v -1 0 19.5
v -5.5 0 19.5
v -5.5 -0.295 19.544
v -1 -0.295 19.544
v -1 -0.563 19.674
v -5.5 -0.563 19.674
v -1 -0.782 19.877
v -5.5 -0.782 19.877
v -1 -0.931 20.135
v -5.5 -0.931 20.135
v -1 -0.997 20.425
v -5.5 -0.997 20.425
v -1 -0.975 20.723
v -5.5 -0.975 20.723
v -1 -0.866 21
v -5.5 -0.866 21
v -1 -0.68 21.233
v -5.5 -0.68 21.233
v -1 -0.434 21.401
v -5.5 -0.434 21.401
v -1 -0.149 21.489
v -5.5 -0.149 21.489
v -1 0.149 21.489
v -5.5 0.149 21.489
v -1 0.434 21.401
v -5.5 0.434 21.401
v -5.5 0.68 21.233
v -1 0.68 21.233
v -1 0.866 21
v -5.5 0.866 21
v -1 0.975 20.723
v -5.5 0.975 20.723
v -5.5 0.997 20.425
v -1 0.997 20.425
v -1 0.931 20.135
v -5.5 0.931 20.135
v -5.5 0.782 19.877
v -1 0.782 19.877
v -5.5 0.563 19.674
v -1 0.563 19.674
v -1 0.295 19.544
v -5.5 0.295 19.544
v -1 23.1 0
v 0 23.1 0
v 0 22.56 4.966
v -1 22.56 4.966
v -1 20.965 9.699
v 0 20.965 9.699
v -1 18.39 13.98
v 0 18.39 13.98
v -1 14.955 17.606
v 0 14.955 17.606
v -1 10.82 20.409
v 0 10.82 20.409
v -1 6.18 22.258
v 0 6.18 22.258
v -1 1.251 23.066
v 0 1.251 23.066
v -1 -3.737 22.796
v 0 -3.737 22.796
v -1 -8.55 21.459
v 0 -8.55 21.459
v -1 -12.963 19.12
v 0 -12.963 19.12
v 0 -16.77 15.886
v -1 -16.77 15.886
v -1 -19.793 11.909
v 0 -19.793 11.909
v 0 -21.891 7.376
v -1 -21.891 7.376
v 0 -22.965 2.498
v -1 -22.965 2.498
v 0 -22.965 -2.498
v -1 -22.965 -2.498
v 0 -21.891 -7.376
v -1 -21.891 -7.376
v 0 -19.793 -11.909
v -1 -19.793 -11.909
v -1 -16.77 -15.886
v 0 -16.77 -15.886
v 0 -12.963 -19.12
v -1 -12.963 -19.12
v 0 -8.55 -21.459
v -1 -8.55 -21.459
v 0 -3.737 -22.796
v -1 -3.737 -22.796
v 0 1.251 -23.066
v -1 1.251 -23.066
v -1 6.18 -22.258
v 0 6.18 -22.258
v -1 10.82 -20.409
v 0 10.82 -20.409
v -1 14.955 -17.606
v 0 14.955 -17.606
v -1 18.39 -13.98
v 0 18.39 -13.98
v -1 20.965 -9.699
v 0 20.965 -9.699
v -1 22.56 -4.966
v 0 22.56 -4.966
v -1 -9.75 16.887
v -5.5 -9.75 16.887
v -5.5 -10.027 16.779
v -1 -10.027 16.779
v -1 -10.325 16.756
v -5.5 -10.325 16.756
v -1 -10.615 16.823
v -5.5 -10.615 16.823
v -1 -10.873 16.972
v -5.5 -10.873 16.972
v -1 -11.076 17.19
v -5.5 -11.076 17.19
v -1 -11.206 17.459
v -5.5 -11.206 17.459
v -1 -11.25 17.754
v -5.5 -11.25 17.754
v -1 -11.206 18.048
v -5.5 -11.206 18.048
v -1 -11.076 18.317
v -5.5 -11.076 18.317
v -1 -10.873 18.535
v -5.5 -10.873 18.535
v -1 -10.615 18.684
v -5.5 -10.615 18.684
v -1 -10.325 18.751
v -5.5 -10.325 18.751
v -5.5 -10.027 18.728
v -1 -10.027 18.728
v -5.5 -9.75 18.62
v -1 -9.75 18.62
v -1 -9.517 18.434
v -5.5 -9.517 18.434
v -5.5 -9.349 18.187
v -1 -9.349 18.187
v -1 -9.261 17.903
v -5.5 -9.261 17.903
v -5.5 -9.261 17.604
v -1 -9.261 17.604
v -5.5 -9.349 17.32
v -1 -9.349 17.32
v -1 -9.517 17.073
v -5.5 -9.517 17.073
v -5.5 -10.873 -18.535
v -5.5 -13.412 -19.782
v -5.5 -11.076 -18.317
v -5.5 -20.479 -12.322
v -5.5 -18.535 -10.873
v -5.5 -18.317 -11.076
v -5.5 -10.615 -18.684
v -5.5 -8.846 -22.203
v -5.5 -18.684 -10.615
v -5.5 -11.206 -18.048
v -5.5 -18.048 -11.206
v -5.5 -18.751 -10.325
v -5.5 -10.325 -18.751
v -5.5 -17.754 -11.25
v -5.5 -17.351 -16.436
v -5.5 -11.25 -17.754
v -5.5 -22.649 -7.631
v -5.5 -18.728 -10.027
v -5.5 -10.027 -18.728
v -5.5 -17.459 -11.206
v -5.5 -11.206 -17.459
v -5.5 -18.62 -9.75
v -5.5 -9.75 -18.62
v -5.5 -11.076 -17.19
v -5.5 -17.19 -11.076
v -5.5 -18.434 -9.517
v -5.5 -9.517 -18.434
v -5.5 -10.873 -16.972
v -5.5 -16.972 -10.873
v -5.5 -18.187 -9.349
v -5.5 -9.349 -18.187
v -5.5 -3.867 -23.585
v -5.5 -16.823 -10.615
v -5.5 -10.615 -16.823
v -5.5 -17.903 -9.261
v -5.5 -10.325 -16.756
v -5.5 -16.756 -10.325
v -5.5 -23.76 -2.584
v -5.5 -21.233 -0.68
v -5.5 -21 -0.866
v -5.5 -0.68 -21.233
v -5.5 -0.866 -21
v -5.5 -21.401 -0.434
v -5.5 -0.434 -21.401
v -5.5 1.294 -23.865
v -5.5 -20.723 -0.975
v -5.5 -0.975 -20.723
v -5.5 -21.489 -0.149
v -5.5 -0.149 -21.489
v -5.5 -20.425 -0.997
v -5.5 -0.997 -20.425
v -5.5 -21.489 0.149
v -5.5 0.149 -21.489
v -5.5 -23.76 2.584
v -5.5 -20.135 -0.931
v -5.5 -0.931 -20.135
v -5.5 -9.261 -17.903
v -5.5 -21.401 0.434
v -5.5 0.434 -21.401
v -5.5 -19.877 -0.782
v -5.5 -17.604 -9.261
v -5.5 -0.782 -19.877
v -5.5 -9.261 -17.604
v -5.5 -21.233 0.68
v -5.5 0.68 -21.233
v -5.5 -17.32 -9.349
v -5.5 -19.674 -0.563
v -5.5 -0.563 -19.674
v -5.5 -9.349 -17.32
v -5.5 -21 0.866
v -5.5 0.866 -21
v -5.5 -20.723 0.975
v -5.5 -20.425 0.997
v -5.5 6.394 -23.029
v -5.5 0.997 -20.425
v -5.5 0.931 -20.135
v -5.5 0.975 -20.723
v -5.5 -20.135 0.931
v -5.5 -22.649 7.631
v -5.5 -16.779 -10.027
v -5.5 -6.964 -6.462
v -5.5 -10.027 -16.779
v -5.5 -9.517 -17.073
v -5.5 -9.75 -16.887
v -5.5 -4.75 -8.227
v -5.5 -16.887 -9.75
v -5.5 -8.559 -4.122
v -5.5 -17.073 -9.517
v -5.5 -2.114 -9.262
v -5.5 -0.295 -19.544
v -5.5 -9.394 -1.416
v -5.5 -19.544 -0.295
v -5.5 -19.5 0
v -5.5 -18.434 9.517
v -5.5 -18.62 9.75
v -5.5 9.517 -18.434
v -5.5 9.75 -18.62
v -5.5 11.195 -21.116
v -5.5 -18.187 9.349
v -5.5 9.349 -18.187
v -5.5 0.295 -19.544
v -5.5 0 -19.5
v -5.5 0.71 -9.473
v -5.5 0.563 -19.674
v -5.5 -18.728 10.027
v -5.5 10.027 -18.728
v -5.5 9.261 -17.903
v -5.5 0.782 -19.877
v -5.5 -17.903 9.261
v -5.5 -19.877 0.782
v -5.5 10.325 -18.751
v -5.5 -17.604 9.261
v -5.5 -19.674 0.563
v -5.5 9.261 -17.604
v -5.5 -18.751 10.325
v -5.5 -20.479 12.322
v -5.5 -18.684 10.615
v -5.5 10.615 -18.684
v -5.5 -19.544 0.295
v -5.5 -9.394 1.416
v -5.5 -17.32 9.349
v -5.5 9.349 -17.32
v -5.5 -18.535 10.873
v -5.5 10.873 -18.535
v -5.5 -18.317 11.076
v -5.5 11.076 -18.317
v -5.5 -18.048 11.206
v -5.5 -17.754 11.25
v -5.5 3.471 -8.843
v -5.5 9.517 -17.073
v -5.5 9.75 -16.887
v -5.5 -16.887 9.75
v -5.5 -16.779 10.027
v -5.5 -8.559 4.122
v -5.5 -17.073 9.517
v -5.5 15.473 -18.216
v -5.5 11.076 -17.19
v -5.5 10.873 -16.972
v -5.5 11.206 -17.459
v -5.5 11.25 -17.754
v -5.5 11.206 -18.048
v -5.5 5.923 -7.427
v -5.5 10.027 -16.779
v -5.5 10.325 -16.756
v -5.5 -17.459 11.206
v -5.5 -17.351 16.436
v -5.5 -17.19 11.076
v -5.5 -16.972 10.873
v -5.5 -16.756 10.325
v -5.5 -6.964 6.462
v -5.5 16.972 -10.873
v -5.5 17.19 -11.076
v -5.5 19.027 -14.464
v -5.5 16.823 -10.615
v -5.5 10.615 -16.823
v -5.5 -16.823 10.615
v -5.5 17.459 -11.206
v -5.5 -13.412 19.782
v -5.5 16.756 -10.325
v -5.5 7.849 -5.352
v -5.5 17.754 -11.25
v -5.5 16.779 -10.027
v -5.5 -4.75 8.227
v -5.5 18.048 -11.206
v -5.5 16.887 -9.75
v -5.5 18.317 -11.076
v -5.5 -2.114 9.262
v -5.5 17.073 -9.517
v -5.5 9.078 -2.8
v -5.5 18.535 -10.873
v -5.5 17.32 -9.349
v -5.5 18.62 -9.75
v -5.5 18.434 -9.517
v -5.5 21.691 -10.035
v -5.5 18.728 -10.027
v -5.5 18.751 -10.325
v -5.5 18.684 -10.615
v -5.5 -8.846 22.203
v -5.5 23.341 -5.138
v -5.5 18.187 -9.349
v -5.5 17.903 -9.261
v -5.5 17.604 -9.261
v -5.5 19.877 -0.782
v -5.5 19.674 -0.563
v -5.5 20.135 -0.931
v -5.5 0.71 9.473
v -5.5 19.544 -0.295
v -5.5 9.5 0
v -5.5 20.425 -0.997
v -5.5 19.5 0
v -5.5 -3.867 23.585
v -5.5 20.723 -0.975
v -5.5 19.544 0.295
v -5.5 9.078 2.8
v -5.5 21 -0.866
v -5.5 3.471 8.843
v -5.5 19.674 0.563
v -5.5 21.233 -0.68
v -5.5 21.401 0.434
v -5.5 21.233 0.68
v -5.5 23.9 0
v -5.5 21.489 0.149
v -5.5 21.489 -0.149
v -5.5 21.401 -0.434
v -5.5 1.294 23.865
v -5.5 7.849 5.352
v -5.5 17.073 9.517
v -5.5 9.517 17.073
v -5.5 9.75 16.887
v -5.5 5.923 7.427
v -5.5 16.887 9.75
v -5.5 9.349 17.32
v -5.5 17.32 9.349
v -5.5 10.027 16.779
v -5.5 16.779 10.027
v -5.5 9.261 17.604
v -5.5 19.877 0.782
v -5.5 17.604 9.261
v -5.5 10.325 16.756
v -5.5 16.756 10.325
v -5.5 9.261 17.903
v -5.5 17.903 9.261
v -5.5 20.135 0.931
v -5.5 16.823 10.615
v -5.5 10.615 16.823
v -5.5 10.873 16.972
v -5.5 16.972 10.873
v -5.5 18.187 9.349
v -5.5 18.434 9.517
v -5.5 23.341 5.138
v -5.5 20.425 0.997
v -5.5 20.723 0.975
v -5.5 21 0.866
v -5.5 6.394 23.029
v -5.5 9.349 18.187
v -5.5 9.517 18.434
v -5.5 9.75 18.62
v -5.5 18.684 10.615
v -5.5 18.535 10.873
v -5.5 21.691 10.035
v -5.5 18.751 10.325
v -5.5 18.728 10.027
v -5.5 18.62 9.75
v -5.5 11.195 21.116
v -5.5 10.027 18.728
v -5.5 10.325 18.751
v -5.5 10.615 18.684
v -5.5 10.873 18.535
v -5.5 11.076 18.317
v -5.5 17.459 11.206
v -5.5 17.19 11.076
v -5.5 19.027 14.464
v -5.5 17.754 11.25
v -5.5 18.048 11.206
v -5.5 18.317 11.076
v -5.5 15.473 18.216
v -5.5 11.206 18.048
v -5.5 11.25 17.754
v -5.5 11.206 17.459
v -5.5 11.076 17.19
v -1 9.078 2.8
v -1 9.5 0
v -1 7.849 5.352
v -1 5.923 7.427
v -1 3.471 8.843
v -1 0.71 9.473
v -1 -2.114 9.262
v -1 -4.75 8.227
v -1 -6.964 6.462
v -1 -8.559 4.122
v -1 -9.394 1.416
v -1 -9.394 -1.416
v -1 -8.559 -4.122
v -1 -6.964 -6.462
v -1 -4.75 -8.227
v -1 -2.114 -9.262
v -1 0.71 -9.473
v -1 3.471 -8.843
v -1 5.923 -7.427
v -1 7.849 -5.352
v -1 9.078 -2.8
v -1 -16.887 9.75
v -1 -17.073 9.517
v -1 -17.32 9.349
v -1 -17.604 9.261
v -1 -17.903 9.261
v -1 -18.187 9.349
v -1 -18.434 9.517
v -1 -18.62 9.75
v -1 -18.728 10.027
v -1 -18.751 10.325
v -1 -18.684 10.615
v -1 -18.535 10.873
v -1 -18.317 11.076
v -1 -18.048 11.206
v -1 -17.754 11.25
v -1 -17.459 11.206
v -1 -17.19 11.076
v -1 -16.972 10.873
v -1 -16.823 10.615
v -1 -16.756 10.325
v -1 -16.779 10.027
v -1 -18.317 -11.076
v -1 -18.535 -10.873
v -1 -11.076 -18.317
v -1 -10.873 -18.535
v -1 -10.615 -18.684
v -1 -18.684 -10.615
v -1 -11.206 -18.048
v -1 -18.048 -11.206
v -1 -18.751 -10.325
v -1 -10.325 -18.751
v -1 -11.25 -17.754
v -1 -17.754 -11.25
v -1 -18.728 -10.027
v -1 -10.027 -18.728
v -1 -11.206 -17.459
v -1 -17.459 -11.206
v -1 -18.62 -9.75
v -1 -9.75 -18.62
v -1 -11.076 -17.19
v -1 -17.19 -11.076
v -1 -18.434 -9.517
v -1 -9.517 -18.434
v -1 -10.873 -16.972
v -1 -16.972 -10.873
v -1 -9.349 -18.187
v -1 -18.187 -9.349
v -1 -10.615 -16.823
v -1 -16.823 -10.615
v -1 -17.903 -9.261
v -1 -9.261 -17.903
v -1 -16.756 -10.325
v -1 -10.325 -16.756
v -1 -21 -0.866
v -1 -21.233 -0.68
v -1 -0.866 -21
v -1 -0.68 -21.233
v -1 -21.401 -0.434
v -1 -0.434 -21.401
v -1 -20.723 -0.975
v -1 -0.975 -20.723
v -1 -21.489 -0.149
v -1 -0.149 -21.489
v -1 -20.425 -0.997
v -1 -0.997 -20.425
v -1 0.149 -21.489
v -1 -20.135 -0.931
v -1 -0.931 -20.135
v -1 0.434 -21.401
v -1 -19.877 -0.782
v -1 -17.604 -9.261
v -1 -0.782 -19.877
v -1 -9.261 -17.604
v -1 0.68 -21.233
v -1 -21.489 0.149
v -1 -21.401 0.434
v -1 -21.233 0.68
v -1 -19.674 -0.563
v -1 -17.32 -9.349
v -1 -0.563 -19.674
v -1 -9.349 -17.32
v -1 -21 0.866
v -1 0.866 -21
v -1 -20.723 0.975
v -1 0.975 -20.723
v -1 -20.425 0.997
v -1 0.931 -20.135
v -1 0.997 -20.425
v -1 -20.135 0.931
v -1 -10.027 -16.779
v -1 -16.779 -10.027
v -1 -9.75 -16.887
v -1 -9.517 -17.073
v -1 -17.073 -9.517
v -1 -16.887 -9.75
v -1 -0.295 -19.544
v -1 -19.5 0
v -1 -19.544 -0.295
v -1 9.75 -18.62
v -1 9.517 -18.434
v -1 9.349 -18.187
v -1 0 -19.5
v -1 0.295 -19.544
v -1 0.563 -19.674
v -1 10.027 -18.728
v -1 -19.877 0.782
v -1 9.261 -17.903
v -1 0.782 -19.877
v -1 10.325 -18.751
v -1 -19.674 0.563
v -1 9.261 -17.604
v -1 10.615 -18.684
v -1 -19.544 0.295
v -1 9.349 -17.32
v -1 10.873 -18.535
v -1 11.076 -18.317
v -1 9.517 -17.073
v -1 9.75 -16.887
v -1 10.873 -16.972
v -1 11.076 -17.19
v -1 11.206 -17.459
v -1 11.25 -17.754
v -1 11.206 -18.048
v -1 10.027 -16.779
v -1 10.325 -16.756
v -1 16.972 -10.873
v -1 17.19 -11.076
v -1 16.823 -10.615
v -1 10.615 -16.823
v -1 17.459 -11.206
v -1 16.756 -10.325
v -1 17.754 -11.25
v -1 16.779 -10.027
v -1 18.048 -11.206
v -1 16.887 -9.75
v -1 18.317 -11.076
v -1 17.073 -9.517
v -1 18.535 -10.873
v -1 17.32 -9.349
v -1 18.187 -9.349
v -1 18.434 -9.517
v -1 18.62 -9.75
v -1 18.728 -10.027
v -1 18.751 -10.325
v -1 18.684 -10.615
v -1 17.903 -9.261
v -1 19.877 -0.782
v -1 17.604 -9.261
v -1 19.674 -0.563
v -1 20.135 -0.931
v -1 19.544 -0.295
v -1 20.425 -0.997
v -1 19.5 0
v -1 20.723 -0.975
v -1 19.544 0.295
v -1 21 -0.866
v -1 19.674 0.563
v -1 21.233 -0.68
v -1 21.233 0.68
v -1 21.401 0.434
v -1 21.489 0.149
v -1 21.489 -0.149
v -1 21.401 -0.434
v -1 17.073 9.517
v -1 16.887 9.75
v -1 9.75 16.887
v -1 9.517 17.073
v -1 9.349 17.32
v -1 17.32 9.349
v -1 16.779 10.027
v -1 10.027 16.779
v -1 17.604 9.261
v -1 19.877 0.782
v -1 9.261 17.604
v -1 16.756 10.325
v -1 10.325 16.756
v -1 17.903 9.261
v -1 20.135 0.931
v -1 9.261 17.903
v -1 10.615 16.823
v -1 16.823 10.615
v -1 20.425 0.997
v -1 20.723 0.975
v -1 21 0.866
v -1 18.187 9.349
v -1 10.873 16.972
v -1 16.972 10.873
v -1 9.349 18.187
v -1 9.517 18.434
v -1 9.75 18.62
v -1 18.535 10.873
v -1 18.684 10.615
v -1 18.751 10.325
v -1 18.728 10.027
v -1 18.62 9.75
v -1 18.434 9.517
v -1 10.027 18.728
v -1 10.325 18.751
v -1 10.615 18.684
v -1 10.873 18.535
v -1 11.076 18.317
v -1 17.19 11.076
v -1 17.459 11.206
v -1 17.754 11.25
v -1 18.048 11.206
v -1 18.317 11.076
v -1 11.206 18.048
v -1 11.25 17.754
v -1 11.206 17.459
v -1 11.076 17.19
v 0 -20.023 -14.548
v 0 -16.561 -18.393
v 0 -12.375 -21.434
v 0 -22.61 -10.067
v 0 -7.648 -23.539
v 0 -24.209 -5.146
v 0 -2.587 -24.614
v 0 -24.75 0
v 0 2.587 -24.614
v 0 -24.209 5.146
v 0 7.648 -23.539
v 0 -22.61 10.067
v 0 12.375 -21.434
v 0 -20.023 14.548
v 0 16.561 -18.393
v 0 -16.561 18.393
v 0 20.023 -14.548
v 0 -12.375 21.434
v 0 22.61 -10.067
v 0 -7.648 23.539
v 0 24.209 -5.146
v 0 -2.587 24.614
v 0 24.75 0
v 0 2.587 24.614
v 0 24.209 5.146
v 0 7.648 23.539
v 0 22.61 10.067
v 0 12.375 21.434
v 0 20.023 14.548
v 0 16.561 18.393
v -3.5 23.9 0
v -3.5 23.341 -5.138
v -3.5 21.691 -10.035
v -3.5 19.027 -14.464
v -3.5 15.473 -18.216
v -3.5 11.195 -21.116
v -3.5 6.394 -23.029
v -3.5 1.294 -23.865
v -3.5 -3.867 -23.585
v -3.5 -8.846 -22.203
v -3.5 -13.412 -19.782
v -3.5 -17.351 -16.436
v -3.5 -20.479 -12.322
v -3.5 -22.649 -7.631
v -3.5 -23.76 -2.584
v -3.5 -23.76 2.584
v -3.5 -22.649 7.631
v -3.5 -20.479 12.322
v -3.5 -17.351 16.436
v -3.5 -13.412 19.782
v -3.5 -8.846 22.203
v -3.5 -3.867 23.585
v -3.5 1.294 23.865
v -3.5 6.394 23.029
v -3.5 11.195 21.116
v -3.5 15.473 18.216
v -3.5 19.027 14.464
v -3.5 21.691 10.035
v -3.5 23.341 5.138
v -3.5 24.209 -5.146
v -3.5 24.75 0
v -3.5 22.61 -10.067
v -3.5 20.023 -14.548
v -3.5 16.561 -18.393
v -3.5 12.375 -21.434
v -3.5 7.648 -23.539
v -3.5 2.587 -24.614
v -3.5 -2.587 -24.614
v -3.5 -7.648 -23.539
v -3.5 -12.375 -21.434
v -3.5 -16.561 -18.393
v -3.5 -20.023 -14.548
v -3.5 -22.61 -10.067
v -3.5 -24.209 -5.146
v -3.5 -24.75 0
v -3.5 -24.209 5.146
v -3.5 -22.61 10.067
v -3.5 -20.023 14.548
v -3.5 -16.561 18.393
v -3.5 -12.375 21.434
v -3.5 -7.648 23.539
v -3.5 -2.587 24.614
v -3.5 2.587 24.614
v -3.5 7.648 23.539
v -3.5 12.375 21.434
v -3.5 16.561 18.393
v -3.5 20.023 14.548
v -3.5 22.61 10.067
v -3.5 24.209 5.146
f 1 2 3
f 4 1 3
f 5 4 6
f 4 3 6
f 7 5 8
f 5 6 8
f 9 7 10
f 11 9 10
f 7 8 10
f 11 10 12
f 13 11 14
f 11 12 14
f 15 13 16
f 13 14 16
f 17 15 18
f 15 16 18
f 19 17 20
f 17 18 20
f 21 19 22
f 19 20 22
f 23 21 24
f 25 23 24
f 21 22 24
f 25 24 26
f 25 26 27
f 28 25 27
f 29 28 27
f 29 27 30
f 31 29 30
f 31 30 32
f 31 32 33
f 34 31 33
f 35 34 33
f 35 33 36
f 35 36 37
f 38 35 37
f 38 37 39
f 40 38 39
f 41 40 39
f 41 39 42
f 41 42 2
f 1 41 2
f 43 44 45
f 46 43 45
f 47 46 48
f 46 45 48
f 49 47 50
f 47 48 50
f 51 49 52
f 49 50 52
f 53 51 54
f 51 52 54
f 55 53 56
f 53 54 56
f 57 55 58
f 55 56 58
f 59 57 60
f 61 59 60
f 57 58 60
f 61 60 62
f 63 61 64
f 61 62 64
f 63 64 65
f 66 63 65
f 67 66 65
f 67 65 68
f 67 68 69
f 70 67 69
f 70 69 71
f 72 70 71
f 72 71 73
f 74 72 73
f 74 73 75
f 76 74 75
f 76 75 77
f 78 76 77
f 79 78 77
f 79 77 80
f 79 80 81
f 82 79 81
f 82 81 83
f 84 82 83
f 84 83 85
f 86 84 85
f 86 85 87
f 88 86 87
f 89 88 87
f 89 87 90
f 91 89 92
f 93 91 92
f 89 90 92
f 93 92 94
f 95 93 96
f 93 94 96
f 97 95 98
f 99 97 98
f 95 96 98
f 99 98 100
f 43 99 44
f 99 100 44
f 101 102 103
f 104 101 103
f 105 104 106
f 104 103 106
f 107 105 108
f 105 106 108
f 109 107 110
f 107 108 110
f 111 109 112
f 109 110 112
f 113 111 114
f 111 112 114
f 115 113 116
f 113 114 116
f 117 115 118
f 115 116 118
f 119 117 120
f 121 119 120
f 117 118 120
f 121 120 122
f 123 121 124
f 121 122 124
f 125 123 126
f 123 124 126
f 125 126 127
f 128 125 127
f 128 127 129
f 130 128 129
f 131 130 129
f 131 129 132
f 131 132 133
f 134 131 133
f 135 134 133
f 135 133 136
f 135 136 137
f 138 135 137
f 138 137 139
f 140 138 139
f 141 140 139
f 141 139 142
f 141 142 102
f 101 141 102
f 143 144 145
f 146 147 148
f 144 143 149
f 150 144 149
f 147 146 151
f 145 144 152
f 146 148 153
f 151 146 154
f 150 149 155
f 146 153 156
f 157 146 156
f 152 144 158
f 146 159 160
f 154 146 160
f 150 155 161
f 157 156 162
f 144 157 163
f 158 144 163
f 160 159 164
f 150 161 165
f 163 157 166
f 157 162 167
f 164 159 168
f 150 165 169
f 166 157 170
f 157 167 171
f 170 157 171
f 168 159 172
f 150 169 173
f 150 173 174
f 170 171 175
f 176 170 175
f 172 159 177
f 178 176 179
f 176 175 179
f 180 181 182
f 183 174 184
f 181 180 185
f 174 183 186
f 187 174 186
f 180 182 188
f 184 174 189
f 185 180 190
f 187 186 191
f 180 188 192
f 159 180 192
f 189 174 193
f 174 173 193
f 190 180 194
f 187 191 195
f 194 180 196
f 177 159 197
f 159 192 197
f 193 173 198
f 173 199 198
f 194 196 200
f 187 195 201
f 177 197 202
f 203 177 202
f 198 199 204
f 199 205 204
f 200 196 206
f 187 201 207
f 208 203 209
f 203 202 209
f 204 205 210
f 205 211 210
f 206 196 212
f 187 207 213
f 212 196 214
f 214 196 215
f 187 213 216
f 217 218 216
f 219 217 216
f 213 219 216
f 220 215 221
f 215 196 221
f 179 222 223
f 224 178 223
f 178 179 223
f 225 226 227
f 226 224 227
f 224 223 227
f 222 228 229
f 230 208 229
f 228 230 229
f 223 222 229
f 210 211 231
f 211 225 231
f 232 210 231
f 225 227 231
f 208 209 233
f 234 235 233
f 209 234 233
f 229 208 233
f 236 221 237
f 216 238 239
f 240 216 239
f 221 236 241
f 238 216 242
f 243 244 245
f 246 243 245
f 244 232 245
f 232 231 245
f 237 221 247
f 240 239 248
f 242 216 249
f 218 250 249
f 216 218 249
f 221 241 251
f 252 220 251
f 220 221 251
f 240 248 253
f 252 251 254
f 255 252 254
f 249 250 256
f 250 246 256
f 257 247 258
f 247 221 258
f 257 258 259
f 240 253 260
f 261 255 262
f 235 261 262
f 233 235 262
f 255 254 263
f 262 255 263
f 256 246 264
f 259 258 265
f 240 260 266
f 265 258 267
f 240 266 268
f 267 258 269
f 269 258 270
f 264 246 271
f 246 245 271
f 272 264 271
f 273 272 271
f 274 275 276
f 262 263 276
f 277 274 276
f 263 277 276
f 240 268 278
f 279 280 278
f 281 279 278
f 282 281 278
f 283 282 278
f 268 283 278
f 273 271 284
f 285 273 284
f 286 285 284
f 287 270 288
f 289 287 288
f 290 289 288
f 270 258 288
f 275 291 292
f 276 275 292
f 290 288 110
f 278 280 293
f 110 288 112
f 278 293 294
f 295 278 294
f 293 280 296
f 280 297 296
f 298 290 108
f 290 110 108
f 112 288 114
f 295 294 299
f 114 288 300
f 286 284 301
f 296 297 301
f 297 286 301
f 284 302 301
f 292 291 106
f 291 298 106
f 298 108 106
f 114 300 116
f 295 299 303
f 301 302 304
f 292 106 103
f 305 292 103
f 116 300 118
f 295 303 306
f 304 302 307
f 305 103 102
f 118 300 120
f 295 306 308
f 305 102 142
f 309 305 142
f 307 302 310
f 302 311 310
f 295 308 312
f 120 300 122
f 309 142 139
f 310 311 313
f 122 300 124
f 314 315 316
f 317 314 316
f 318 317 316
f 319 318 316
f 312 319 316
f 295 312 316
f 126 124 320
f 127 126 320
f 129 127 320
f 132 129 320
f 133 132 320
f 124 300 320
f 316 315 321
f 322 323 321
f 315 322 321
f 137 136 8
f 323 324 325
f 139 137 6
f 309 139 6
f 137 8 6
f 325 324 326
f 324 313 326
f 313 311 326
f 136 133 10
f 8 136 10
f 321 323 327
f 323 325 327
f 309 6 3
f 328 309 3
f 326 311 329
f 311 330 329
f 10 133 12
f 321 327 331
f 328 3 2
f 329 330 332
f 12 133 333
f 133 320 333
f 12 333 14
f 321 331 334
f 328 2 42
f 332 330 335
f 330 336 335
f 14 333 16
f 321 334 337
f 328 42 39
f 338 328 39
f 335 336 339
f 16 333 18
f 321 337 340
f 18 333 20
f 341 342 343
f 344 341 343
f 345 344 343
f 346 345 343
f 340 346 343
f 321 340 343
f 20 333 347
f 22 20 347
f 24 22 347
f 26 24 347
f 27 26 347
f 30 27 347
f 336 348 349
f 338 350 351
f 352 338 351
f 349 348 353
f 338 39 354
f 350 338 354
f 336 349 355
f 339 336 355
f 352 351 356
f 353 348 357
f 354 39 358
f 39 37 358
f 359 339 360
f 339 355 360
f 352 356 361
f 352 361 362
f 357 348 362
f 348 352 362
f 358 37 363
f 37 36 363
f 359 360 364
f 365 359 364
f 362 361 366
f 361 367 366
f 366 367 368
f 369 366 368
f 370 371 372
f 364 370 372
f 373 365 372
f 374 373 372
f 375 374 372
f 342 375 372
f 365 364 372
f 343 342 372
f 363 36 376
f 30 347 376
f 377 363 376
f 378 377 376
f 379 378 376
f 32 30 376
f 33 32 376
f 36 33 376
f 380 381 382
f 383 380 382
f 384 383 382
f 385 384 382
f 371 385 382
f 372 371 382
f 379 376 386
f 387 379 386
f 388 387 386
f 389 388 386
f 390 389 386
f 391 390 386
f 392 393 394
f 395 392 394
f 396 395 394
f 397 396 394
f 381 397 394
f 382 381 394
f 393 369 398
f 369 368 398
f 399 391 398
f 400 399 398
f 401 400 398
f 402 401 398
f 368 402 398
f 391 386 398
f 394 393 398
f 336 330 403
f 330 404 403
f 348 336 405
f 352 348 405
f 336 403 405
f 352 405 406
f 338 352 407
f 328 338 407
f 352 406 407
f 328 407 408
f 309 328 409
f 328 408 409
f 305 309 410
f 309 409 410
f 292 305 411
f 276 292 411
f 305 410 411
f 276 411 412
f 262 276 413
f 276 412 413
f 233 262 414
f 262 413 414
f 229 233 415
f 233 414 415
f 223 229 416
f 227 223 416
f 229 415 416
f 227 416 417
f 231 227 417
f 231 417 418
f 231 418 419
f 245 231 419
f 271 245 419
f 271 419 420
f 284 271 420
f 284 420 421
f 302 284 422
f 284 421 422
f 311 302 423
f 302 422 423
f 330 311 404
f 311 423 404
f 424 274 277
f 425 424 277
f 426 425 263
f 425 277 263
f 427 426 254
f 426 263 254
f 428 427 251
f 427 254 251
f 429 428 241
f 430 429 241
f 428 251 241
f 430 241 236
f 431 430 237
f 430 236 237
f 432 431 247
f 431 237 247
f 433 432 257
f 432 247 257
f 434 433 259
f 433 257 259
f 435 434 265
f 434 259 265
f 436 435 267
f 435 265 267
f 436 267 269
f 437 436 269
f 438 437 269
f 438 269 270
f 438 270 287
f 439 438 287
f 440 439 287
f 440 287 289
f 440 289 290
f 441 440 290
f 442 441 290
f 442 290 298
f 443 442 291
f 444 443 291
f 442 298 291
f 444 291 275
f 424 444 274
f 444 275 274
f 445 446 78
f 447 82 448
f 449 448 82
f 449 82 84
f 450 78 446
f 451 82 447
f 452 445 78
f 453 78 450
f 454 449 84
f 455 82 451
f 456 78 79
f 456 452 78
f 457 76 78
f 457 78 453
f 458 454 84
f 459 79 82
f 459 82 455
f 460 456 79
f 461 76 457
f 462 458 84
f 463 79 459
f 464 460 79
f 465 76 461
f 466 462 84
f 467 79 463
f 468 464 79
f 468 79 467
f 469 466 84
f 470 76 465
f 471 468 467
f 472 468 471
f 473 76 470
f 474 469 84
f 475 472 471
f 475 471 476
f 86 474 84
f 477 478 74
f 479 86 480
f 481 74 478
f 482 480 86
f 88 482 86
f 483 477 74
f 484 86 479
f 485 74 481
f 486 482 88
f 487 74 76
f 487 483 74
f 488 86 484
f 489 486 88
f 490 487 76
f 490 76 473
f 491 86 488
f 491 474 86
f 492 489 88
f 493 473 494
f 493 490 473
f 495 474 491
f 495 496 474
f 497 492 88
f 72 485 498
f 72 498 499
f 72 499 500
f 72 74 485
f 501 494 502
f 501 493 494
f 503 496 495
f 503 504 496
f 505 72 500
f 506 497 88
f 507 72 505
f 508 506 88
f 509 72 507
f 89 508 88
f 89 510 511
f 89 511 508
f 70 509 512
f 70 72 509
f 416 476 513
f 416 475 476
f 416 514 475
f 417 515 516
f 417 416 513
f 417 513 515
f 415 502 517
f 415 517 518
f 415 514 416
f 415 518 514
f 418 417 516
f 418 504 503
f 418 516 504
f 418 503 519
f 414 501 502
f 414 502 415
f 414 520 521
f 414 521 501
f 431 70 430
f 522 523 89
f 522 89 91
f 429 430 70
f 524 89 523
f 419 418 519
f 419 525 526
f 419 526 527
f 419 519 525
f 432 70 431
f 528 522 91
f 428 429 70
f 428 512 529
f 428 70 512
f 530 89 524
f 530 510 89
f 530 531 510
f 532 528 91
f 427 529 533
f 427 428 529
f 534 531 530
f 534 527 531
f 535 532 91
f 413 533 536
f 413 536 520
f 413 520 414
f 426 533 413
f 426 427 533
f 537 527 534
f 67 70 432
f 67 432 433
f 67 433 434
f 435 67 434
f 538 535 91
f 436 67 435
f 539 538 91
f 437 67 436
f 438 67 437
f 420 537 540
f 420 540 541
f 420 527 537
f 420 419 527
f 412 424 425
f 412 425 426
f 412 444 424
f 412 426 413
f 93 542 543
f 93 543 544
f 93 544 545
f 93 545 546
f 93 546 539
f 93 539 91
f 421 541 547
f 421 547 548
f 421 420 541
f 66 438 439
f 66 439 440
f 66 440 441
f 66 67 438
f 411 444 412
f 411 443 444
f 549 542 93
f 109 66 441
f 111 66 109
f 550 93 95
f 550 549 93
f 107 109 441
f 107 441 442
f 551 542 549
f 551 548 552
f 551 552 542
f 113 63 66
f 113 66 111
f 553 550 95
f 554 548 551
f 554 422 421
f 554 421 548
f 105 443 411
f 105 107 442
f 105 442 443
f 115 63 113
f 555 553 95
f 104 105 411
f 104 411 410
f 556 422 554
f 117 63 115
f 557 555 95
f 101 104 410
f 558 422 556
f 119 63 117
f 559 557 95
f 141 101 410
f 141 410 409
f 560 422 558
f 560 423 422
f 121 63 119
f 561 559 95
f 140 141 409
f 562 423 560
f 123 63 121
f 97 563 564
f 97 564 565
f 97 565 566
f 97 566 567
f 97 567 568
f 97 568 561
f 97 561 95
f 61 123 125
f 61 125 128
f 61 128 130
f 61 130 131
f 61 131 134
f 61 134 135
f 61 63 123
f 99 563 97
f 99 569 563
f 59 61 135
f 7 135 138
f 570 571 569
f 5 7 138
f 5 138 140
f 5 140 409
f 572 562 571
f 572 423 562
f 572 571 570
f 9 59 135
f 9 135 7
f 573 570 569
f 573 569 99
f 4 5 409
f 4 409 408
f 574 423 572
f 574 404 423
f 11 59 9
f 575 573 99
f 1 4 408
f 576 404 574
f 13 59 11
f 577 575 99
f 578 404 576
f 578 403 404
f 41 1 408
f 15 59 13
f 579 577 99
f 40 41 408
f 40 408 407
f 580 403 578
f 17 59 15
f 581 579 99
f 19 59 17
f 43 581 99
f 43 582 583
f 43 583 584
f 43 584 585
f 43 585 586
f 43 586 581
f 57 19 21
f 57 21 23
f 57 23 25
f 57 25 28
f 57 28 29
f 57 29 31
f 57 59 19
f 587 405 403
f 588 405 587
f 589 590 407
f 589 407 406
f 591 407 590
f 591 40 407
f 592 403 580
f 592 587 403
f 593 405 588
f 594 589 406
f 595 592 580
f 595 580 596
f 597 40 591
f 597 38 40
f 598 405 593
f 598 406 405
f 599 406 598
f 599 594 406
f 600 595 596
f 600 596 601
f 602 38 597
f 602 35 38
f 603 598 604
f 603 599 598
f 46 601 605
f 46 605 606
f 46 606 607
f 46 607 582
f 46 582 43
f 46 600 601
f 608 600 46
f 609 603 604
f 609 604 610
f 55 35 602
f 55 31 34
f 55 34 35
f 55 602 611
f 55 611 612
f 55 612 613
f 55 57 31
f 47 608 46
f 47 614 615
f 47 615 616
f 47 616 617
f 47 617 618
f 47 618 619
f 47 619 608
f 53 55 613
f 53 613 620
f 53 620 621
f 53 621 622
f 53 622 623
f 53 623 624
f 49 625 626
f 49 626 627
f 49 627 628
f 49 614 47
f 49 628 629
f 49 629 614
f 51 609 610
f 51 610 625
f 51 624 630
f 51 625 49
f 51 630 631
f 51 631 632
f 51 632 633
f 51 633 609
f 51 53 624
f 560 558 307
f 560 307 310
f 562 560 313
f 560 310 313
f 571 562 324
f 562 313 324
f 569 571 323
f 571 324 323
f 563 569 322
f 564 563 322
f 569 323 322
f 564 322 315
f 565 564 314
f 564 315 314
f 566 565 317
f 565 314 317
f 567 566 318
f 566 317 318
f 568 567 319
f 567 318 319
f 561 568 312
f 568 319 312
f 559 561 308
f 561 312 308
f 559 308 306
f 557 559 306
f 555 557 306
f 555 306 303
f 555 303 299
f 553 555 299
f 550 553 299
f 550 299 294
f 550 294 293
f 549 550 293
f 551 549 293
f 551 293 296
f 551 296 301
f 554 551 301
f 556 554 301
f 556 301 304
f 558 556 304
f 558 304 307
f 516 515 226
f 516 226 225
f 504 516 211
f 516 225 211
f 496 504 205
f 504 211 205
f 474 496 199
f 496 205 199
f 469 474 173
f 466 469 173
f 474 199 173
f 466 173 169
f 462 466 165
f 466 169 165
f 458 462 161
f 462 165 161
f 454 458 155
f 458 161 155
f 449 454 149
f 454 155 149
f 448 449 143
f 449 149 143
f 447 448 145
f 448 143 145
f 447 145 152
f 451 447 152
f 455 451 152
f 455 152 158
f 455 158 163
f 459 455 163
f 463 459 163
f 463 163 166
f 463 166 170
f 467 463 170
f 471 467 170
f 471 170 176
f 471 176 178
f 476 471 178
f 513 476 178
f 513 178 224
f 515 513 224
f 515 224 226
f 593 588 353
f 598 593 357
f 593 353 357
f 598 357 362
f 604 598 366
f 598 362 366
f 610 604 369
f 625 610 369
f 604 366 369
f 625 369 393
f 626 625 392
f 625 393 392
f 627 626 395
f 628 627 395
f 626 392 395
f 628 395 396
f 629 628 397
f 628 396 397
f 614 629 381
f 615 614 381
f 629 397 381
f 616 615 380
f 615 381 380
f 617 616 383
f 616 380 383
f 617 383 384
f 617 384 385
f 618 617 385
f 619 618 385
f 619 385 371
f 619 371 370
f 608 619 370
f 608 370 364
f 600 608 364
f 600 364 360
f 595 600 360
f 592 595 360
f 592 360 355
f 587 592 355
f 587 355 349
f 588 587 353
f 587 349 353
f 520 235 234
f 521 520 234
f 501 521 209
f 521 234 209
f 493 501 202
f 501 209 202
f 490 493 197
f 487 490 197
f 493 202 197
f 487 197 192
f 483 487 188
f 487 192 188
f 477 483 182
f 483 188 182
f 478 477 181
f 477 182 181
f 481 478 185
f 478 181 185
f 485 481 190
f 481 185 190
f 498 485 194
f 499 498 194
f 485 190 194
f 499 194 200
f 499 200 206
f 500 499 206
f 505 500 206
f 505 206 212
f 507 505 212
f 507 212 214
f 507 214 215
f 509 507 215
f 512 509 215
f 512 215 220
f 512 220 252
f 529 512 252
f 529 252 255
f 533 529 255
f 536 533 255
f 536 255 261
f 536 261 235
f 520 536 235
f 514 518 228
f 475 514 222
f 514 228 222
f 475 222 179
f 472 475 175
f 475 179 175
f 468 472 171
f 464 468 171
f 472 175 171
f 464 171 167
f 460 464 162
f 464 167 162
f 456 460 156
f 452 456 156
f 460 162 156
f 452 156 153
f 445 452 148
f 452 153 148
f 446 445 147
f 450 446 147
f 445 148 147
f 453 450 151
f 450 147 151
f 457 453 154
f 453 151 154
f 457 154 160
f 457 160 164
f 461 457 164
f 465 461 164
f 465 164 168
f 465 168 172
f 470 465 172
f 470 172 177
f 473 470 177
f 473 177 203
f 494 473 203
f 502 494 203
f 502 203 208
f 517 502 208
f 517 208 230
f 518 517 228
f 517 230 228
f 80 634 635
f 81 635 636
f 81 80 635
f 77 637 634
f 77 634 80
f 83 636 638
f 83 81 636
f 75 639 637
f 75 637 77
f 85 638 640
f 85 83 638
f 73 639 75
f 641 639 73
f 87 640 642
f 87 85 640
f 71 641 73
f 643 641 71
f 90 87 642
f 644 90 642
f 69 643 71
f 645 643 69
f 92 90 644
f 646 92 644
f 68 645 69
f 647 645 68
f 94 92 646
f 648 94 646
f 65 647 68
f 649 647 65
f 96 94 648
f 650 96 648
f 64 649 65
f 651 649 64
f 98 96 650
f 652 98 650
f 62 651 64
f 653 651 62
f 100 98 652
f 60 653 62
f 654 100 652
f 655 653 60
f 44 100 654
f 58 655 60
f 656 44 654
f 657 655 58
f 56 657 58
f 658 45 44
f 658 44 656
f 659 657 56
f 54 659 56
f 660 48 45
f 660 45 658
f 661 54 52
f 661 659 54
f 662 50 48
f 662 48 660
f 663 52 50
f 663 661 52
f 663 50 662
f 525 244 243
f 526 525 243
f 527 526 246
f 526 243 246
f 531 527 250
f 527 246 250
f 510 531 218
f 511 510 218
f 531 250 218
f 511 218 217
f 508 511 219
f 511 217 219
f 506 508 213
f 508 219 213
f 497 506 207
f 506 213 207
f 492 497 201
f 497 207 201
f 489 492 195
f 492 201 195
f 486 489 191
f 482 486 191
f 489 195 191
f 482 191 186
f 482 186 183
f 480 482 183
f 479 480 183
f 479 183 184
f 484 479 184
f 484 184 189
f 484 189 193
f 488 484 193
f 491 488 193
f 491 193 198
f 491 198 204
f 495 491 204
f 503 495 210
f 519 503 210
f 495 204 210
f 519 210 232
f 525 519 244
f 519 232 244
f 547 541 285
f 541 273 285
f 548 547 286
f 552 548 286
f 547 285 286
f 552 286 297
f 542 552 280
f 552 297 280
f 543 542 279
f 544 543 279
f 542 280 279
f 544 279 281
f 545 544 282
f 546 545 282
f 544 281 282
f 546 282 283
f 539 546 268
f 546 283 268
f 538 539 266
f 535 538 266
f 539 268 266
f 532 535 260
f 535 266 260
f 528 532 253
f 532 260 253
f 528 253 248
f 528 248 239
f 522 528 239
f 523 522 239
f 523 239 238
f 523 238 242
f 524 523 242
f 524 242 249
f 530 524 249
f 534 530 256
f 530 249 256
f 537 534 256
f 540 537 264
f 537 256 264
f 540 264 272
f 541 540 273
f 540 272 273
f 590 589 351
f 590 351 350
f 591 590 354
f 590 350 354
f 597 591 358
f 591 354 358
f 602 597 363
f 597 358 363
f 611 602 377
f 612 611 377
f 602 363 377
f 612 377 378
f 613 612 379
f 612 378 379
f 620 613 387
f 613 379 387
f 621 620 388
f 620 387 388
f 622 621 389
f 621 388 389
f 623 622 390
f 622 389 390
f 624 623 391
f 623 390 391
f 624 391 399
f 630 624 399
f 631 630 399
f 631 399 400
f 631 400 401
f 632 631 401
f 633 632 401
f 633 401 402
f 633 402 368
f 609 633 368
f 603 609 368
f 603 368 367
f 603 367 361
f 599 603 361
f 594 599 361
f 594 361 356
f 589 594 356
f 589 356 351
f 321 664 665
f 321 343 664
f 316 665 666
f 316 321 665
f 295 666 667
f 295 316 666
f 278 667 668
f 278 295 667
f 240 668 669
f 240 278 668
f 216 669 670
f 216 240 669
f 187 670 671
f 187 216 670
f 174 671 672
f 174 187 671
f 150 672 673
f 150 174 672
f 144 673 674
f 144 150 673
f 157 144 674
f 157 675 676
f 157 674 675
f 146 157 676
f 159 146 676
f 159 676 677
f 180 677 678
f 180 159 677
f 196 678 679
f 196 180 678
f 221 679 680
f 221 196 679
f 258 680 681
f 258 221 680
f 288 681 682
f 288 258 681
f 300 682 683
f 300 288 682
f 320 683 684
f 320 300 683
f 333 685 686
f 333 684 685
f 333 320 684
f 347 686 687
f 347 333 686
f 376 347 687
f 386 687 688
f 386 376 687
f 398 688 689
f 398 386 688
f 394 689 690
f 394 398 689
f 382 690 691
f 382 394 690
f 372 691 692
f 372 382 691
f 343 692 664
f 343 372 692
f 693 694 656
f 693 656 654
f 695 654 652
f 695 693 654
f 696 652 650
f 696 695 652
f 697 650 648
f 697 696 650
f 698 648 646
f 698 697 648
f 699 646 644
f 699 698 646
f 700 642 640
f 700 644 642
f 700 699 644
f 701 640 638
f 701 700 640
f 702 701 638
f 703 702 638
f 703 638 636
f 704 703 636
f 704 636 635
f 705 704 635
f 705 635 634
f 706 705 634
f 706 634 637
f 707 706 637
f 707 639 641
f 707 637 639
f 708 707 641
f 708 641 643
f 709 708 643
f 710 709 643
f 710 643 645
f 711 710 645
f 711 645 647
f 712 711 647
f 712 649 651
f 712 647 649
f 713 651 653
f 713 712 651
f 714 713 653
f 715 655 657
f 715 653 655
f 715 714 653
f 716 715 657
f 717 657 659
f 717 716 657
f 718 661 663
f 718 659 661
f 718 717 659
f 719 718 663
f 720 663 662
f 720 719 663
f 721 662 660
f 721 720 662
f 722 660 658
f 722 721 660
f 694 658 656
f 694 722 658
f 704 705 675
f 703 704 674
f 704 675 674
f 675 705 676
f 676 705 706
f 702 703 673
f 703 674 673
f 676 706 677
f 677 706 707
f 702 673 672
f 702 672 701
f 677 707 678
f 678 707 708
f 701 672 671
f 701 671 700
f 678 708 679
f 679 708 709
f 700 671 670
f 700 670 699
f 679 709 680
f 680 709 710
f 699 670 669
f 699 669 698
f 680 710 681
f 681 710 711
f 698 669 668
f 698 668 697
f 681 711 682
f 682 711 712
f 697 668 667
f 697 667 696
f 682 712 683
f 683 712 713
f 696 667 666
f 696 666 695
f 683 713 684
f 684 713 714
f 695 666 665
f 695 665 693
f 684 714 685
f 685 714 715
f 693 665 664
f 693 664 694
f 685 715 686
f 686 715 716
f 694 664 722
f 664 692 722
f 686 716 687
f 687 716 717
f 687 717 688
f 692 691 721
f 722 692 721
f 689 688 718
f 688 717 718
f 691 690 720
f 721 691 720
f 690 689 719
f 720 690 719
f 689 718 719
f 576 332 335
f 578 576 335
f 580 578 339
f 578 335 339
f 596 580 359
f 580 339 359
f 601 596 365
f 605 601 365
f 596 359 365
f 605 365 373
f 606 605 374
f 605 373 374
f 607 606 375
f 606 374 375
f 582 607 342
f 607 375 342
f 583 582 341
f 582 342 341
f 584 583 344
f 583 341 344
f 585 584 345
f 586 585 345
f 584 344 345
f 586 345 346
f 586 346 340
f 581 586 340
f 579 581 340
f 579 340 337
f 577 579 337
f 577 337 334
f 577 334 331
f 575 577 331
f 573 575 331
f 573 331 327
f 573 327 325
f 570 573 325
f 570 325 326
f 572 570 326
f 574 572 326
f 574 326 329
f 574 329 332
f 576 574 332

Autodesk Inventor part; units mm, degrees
ref_plane "YZ Plane" through (0, 0, 0) normal (1, 0, 0) x (0, 1, 0)
ref_plane "XZ Plane" through (0, 0, 0) normal (0, 1, 0) x (-1, 0, 0)
ref_plane "XY Plane" through (0, 0, 0) normal (0, 0, 1) x (1, 0, 0)
sketch "Sketch1" plane through (0, 0, 0) normal (0, 0, 1) x (1, 0, 0)
  line L0 (-6.6, 0) -> (1.1, 0) construction
  line L1 (0, -4.95) -> (0, 29.7) construction
  line L2 (-1, 9.5) -> (-1, 23.1)
  line L3 (-1, 23.1) -> (0, 23.1)
  line L4 (0, 23.1) -> (0, 24.75)
  line L5 (0, 24.75) -> (-3.5, 24.75)
  line L6 (-3.5, 24.75) -> (-3.5, 23.9)
  line L7 (-3.5, 23.9) -> (-5.5, 23.9)
  line L8 (-5.5, 23.9) -> (-5.5, 9.5)
  line L9 (-5.5, 9.5) -> (-1, 9.5)
  point P0 (0, 0)
  dimension "d0" = 49.5
  dimension "d1" = 47.8
  dimension "d2" = 19
  dimension "d3" = 2
  dimension "d4" = 1
  dimension "d5" = 5.5
  dimension "d6" = 46.2
revolve "Revolution1" add sketch "Sketch1" angle 360 about axis through (-10, 0, 0) along (1, 0, 0)
sketch "Sketch2" plane through (-1, 0, 0) normal (1, 0, 0) x (0, 0, -1)
  line L0 (0, -34.65) -> (0, 34.65) projected
  line L1 (34.65, 0) -> (-34.65, 0) projected
  point P0 (0, 0)
  point P1 (-20.5, 0)
  dimension "d8" = 20.5
hole "Hole1" at (-1, 0, 20.5) direction (-1, 0, 0) diameter 2 end through all
pattern_circular "Circular Pattern1" count 12 over 360 about axis through (-10, 0, 0) along (1, 0, 0) of "Hole1"
thread "Thread1" size "M20x1" class "6H" standard "ISO Metric profile" full length
properties part number "P302Base" material "ABS Plastic"
